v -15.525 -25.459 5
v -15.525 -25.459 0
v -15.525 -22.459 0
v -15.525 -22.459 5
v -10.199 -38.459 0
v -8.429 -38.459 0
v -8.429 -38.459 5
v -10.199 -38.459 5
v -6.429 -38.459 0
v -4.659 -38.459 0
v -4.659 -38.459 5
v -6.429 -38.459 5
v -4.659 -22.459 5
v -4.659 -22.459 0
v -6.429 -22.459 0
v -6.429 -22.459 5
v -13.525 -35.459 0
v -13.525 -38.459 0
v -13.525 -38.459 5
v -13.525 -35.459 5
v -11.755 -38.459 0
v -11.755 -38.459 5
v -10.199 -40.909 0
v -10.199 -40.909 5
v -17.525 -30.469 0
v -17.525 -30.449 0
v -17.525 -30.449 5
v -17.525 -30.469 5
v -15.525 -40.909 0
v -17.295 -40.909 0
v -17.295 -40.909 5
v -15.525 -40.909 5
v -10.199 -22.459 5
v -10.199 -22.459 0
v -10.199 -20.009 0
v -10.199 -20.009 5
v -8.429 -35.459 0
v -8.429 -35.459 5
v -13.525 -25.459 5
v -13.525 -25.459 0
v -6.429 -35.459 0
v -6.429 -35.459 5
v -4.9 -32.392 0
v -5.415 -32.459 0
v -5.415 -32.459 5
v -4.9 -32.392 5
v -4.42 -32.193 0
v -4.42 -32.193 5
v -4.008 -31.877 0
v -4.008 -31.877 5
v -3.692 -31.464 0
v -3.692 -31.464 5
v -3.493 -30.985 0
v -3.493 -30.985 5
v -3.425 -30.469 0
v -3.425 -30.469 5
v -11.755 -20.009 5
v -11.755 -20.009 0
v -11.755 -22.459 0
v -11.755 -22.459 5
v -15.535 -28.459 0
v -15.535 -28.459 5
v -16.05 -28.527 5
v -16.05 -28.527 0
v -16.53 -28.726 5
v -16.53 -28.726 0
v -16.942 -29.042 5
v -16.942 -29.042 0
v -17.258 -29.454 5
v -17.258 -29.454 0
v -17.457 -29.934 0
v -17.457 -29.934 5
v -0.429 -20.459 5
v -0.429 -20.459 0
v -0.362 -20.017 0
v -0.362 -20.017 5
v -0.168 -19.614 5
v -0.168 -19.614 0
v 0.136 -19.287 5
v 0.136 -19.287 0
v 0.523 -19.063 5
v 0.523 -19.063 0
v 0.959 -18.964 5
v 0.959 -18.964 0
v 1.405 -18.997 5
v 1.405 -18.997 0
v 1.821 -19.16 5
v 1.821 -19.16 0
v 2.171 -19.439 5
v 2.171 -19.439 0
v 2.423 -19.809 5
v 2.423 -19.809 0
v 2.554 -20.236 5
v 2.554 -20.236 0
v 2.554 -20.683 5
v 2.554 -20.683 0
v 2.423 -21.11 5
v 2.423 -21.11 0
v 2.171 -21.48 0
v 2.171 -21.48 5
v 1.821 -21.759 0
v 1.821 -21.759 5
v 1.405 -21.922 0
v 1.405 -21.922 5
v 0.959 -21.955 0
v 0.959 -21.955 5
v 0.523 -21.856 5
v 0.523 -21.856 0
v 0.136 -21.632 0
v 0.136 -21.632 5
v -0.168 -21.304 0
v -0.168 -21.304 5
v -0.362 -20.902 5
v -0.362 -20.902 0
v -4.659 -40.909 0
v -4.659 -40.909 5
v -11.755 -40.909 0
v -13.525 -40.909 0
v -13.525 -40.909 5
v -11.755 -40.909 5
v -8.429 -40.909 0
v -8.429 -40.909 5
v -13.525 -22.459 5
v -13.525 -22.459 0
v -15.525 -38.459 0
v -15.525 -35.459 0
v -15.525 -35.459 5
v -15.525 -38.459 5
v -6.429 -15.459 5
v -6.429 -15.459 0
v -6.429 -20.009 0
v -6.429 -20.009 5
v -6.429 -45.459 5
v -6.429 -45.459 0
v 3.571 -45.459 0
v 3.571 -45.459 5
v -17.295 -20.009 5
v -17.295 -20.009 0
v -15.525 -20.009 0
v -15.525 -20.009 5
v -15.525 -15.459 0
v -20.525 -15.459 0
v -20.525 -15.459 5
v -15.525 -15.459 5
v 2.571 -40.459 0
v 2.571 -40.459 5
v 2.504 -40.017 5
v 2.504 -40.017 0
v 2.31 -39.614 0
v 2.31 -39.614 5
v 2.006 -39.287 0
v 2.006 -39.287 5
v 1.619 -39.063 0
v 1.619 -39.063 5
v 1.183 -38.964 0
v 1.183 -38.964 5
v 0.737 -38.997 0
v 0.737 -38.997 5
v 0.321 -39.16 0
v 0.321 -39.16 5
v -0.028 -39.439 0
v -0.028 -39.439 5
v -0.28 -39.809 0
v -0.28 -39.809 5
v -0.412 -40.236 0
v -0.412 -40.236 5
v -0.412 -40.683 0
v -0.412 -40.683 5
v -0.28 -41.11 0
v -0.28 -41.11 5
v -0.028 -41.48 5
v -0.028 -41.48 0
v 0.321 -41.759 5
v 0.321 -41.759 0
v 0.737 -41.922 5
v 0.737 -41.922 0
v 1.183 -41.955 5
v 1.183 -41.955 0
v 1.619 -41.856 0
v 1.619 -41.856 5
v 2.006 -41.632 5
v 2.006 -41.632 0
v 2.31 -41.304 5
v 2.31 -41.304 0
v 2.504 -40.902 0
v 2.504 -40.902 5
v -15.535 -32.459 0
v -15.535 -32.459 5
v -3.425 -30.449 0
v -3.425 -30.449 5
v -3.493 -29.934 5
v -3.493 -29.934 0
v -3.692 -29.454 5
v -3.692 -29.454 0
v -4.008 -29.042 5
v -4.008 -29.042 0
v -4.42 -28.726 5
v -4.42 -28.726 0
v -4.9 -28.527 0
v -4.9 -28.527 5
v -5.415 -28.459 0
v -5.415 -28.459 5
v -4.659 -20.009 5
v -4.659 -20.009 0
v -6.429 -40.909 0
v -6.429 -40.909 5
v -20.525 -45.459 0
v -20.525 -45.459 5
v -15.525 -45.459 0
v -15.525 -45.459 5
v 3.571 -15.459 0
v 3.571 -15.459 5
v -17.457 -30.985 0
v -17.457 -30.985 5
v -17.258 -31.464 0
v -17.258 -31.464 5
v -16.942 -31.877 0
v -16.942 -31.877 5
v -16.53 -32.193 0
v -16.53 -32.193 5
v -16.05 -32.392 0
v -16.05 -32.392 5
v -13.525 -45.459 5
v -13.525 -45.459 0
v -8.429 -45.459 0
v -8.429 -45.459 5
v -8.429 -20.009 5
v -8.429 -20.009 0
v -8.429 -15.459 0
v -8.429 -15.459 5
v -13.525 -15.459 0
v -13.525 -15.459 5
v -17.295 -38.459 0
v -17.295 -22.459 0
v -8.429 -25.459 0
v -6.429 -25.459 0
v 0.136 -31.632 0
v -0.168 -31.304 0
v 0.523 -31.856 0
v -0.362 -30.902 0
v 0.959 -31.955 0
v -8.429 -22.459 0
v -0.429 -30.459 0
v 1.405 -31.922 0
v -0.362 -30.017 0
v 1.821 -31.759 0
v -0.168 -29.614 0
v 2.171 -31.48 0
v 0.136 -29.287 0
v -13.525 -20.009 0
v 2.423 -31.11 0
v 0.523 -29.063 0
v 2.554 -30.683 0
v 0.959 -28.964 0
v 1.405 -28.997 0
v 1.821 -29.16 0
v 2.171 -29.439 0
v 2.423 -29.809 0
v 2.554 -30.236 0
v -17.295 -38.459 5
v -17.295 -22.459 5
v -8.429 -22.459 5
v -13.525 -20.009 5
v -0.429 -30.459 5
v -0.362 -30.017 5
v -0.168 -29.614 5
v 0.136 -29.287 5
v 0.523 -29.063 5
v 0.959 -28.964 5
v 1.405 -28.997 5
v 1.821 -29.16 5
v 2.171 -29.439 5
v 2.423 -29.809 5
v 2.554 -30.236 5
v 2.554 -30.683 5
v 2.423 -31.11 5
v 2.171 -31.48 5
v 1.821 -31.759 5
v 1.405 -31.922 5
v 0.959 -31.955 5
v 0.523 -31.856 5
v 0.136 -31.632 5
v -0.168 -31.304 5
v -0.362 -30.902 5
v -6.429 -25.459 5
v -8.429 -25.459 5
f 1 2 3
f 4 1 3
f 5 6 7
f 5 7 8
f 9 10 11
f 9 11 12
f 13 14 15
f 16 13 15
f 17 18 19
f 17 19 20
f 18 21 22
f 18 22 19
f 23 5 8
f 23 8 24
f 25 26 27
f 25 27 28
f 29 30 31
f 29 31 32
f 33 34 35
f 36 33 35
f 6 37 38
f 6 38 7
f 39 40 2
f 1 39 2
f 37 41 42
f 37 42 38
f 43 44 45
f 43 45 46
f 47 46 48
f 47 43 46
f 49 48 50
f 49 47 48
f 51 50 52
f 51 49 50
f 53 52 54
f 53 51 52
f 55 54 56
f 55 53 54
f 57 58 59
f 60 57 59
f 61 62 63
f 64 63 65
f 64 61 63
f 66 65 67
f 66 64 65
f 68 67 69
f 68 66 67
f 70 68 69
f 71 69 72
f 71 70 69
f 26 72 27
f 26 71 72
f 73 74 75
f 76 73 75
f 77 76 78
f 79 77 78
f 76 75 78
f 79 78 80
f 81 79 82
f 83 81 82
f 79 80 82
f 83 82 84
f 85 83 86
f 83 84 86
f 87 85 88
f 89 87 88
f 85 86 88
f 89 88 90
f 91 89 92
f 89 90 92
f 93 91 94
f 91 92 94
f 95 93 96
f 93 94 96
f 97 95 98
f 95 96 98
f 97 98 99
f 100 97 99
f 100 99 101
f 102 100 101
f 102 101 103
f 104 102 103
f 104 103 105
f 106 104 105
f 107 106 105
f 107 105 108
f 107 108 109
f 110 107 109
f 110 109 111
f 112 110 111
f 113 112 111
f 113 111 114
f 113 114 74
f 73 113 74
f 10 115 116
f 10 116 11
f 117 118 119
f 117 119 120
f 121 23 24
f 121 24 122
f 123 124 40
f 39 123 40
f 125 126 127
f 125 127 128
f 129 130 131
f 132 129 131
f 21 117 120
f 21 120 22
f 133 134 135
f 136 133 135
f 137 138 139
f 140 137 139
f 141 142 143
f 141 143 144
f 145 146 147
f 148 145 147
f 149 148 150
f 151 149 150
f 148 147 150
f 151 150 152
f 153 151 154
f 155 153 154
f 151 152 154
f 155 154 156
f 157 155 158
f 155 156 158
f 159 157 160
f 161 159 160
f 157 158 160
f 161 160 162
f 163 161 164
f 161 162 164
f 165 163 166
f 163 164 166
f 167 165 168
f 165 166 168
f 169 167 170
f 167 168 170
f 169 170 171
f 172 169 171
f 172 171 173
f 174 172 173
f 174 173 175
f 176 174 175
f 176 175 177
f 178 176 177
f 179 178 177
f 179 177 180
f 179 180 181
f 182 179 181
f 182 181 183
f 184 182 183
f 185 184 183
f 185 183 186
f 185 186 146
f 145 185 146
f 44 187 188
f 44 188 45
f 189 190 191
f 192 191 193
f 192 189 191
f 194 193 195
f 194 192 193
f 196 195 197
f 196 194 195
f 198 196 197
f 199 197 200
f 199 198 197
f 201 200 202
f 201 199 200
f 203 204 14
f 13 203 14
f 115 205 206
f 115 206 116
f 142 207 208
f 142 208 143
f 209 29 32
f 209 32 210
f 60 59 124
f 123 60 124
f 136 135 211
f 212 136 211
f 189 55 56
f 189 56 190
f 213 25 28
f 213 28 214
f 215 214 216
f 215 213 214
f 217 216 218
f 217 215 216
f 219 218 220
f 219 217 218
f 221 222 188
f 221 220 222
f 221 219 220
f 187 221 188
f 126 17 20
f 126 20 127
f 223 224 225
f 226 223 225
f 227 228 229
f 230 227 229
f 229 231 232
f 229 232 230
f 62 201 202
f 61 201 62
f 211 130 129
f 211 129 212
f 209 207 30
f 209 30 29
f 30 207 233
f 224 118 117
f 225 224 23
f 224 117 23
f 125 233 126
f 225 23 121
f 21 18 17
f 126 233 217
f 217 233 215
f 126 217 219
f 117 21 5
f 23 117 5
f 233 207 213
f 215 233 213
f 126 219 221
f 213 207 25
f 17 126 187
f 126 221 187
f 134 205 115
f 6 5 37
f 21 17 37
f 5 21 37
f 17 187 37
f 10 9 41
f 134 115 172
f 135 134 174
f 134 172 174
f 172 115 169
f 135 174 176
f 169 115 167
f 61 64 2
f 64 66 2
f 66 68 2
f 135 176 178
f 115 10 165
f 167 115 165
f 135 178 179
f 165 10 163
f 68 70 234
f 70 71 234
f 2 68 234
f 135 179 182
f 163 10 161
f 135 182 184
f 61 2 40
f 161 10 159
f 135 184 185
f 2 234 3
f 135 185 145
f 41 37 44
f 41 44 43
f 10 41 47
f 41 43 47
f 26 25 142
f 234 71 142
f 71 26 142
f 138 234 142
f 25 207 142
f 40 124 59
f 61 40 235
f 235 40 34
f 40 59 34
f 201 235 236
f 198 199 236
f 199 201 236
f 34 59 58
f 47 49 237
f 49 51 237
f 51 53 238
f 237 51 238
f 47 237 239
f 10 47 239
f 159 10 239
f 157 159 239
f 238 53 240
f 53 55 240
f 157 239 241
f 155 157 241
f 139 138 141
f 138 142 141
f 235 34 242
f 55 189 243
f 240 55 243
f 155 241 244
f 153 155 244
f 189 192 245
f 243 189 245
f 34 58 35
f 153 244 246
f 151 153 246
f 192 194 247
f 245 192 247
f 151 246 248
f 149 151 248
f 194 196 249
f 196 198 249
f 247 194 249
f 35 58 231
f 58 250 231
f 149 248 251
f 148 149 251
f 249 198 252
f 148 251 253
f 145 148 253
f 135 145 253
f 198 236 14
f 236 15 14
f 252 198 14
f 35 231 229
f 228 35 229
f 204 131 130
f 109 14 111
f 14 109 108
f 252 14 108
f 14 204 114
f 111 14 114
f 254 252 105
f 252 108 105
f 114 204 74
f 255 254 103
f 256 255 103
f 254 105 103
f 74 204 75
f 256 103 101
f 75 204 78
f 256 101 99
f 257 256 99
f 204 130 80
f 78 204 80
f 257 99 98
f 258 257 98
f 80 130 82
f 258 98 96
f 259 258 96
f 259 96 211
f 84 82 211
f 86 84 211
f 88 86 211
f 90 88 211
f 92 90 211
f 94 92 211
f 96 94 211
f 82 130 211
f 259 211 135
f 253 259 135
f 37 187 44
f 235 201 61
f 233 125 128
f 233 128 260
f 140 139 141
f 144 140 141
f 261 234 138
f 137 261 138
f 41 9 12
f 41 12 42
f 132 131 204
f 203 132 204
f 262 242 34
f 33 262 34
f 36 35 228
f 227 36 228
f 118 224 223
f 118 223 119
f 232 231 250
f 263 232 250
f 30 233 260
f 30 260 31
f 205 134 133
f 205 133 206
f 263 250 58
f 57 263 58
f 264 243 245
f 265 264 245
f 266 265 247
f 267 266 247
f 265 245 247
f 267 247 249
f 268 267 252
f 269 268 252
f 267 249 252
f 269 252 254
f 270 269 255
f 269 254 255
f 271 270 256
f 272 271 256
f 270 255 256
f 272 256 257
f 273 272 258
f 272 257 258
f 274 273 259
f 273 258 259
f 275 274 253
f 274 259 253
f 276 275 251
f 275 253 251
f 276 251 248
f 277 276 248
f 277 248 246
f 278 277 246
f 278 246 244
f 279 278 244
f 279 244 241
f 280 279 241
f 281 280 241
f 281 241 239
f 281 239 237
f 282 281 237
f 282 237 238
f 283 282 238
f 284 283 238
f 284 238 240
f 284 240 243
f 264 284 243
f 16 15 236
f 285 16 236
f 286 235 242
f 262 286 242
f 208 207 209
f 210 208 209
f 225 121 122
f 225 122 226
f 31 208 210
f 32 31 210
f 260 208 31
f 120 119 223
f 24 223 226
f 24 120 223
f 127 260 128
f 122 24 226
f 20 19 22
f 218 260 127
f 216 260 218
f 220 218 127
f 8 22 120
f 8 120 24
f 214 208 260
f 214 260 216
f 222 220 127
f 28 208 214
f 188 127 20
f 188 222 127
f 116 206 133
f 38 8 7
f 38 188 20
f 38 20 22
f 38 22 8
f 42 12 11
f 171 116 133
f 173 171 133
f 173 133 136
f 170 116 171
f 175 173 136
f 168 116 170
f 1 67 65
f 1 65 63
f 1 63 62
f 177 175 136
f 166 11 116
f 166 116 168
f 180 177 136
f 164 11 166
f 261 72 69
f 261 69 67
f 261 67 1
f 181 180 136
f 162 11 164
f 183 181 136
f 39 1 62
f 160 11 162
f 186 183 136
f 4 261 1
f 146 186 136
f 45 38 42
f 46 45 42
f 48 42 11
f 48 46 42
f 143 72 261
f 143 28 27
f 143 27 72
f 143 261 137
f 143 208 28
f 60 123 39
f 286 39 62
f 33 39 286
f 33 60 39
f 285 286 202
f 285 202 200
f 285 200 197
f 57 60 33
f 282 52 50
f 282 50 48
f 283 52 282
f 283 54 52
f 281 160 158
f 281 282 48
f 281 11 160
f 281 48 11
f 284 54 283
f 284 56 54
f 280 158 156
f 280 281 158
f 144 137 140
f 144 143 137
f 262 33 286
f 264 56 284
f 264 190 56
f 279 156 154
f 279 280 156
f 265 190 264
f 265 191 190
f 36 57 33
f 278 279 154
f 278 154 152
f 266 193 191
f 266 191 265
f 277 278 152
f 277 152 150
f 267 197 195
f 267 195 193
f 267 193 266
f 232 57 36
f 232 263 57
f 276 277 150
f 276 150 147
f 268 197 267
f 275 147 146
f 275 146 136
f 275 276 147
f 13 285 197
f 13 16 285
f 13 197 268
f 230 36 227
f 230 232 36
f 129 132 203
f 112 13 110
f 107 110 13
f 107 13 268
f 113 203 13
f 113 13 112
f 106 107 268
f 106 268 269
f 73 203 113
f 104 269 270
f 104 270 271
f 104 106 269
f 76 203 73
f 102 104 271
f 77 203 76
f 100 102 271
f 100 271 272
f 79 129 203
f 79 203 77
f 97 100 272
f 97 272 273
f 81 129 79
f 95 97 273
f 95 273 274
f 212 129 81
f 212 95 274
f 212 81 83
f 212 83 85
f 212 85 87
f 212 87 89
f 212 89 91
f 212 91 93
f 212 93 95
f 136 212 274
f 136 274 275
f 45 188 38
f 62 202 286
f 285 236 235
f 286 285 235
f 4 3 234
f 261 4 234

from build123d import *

# Parameters (mm, degrees)
ESBO_O1_W                = 24.096
ESBO_O1_H                = 30
RESSALTO_EXTRUS_O1_DEPTH = 5
ESBO_O2_R                = 1.5
CORTE_EXTRUS_O1_DEPTH    = 10
CORTE_EXTRUS_O2_DEPTH    = 6
CORTE_EXTRUS_O3_DEPTH    = 10
ESBO_O5_R                = 1.5
CORTE_EXTRUS_O4_DEPTH    = 6


with BuildPart() as part:
    # Esboço1 → Ressalto-extrusão1 (new body)
    with BuildSketch(Plane.XY):
        with Locations((-8.476916648, -30.459463918)):
            Rectangle(ESBO_O1_W, ESBO_O1_H)
    extrude(amount=RESSALTO_EXTRUS_O1_DEPTH)

    # Esboço2 → Corte-extrusão1 (cut)
    with BuildSketch(Plane(origin=(0, 0, 0), x_dir=(-1, 0, 0), z_dir=(0, 0, -1))):
        with Locations((-1.071083352, -30.459463918)):
            Circle(ESBO_O2_R)
        with Locations((-1.071083352, -20.459463918)):
            Circle(ESBO_O2_R)
    extrude(amount=-CORTE_EXTRUS_O1_DEPTH, mode=Mode.SUBTRACT)

    # Esboço3 → Corte-extrusão2 (cut, through all)
    with BuildSketch(Plane(origin=(0, 0, 0), x_dir=(-1, 0, 0), z_dir=(0, 0, -1))):
        Polygon((15.524916648, -15.459463918), (13.524916648, -15.459463918), (13.524916648, -20.009463918), (11.754916648, -20.009463918), (11.754916648, -22.459463918), (13.524916648, -22.459463918), (13.524916648, -25.459463918), (15.524916648, -25.459463918), (15.524916648, -22.459463918), (17.294916648, -22.459463918), (17.294916648, -20.009463918), (15.524916648, -20.009463918), align=None)
        Polygon((8.428916648, -15.459463918), (6.428916648, -15.459463918), (6.428916648, -20.009463918), (4.658916648, -20.009463918), (4.658916648, -22.459463918), (6.428916648, -22.459463918), (6.428916648, -25.459463918), (8.428916648, -25.459463918), (8.428916648, -22.459463918), (10.198916648, -22.459463918), (10.198916648, -20.009463918), (8.428916648, -20.009463918), align=None)
        Polygon((6.428916648, -40.909463918), (4.658916648, -40.909463918), (4.658916648, -38.459463918), (6.428916648, -38.459463918), (6.428916648, -35.459463918), (8.428916648, -35.459463918), (8.428916648, -38.459463918), (10.198916648, -38.459463918), (10.198916648, -40.909463918), (8.428916648, -40.909463918), (8.428916648, -45.459463918), (6.428916648, -45.459463918), align=None)
        Polygon((13.524916648, -40.909463918), (11.754916648, -40.909463918), (11.754916648, -38.459463918), (13.524916648, -38.459463918), (13.524916648, -35.459463918), (15.524916648, -35.459463918), (15.524916648, -38.459463918), (17.294916648, -38.459463918), (17.294916648, -40.909463918), (15.524916648, -40.909463918), (15.524916648, -45.459463918), (13.524916648, -45.459463918), align=None)
    extrude(amount=-CORTE_EXTRUS_O2_DEPTH, mode=Mode.SUBTRACT)

    # Esboço4 → Corte-extrusão3 (cut)
    with BuildSketch(Plane(origin=(0, 0, 0), x_dir=(-1, 0, 0), z_dir=(0, 0, -1))):
        with BuildLine():
            Line((15.534916648, -32.459463918), (5.415284958, -32.459463918))
            ThreePointArc((5.415284958, -32.459463918), (4.008142463, -31.876606412), (3.425284958, -30.469463918))
            Line((3.425284958, -30.469463918), (3.425284958, -30.449463918))
            ThreePointArc((3.425284958, -30.449463918), (4.008142463, -29.042321423), (5.415284958, -28.459463918))
            Line((5.415284958, -28.459463918), (15.534916648, -28.459463918))
            ThreePointArc((15.534916648, -28.459463918), (16.942059143, -29.042321423), (17.524916648, -30.449463918))
            Line((17.524916648, -30.449463918), (17.524916648, -30.469463918))
            ThreePointArc((17.524916648, -30.469463918), (16.942059143, -31.876606412), (15.534916648, -32.459463918))
        make_face()
    extrude(amount=-CORTE_EXTRUS_O3_DEPTH, mode=Mode.SUBTRACT)

    # Esboço5 → Corte-extrusão4 (cut, through all)
    with BuildSketch(Plane.XY.offset(5)):
        with Locations((1.071083352, -40.459463918)):
            Circle(ESBO_O5_R)
    extrude(amount=-CORTE_EXTRUS_O4_DEPTH, mode=Mode.SUBTRACT)


solid = part.part
